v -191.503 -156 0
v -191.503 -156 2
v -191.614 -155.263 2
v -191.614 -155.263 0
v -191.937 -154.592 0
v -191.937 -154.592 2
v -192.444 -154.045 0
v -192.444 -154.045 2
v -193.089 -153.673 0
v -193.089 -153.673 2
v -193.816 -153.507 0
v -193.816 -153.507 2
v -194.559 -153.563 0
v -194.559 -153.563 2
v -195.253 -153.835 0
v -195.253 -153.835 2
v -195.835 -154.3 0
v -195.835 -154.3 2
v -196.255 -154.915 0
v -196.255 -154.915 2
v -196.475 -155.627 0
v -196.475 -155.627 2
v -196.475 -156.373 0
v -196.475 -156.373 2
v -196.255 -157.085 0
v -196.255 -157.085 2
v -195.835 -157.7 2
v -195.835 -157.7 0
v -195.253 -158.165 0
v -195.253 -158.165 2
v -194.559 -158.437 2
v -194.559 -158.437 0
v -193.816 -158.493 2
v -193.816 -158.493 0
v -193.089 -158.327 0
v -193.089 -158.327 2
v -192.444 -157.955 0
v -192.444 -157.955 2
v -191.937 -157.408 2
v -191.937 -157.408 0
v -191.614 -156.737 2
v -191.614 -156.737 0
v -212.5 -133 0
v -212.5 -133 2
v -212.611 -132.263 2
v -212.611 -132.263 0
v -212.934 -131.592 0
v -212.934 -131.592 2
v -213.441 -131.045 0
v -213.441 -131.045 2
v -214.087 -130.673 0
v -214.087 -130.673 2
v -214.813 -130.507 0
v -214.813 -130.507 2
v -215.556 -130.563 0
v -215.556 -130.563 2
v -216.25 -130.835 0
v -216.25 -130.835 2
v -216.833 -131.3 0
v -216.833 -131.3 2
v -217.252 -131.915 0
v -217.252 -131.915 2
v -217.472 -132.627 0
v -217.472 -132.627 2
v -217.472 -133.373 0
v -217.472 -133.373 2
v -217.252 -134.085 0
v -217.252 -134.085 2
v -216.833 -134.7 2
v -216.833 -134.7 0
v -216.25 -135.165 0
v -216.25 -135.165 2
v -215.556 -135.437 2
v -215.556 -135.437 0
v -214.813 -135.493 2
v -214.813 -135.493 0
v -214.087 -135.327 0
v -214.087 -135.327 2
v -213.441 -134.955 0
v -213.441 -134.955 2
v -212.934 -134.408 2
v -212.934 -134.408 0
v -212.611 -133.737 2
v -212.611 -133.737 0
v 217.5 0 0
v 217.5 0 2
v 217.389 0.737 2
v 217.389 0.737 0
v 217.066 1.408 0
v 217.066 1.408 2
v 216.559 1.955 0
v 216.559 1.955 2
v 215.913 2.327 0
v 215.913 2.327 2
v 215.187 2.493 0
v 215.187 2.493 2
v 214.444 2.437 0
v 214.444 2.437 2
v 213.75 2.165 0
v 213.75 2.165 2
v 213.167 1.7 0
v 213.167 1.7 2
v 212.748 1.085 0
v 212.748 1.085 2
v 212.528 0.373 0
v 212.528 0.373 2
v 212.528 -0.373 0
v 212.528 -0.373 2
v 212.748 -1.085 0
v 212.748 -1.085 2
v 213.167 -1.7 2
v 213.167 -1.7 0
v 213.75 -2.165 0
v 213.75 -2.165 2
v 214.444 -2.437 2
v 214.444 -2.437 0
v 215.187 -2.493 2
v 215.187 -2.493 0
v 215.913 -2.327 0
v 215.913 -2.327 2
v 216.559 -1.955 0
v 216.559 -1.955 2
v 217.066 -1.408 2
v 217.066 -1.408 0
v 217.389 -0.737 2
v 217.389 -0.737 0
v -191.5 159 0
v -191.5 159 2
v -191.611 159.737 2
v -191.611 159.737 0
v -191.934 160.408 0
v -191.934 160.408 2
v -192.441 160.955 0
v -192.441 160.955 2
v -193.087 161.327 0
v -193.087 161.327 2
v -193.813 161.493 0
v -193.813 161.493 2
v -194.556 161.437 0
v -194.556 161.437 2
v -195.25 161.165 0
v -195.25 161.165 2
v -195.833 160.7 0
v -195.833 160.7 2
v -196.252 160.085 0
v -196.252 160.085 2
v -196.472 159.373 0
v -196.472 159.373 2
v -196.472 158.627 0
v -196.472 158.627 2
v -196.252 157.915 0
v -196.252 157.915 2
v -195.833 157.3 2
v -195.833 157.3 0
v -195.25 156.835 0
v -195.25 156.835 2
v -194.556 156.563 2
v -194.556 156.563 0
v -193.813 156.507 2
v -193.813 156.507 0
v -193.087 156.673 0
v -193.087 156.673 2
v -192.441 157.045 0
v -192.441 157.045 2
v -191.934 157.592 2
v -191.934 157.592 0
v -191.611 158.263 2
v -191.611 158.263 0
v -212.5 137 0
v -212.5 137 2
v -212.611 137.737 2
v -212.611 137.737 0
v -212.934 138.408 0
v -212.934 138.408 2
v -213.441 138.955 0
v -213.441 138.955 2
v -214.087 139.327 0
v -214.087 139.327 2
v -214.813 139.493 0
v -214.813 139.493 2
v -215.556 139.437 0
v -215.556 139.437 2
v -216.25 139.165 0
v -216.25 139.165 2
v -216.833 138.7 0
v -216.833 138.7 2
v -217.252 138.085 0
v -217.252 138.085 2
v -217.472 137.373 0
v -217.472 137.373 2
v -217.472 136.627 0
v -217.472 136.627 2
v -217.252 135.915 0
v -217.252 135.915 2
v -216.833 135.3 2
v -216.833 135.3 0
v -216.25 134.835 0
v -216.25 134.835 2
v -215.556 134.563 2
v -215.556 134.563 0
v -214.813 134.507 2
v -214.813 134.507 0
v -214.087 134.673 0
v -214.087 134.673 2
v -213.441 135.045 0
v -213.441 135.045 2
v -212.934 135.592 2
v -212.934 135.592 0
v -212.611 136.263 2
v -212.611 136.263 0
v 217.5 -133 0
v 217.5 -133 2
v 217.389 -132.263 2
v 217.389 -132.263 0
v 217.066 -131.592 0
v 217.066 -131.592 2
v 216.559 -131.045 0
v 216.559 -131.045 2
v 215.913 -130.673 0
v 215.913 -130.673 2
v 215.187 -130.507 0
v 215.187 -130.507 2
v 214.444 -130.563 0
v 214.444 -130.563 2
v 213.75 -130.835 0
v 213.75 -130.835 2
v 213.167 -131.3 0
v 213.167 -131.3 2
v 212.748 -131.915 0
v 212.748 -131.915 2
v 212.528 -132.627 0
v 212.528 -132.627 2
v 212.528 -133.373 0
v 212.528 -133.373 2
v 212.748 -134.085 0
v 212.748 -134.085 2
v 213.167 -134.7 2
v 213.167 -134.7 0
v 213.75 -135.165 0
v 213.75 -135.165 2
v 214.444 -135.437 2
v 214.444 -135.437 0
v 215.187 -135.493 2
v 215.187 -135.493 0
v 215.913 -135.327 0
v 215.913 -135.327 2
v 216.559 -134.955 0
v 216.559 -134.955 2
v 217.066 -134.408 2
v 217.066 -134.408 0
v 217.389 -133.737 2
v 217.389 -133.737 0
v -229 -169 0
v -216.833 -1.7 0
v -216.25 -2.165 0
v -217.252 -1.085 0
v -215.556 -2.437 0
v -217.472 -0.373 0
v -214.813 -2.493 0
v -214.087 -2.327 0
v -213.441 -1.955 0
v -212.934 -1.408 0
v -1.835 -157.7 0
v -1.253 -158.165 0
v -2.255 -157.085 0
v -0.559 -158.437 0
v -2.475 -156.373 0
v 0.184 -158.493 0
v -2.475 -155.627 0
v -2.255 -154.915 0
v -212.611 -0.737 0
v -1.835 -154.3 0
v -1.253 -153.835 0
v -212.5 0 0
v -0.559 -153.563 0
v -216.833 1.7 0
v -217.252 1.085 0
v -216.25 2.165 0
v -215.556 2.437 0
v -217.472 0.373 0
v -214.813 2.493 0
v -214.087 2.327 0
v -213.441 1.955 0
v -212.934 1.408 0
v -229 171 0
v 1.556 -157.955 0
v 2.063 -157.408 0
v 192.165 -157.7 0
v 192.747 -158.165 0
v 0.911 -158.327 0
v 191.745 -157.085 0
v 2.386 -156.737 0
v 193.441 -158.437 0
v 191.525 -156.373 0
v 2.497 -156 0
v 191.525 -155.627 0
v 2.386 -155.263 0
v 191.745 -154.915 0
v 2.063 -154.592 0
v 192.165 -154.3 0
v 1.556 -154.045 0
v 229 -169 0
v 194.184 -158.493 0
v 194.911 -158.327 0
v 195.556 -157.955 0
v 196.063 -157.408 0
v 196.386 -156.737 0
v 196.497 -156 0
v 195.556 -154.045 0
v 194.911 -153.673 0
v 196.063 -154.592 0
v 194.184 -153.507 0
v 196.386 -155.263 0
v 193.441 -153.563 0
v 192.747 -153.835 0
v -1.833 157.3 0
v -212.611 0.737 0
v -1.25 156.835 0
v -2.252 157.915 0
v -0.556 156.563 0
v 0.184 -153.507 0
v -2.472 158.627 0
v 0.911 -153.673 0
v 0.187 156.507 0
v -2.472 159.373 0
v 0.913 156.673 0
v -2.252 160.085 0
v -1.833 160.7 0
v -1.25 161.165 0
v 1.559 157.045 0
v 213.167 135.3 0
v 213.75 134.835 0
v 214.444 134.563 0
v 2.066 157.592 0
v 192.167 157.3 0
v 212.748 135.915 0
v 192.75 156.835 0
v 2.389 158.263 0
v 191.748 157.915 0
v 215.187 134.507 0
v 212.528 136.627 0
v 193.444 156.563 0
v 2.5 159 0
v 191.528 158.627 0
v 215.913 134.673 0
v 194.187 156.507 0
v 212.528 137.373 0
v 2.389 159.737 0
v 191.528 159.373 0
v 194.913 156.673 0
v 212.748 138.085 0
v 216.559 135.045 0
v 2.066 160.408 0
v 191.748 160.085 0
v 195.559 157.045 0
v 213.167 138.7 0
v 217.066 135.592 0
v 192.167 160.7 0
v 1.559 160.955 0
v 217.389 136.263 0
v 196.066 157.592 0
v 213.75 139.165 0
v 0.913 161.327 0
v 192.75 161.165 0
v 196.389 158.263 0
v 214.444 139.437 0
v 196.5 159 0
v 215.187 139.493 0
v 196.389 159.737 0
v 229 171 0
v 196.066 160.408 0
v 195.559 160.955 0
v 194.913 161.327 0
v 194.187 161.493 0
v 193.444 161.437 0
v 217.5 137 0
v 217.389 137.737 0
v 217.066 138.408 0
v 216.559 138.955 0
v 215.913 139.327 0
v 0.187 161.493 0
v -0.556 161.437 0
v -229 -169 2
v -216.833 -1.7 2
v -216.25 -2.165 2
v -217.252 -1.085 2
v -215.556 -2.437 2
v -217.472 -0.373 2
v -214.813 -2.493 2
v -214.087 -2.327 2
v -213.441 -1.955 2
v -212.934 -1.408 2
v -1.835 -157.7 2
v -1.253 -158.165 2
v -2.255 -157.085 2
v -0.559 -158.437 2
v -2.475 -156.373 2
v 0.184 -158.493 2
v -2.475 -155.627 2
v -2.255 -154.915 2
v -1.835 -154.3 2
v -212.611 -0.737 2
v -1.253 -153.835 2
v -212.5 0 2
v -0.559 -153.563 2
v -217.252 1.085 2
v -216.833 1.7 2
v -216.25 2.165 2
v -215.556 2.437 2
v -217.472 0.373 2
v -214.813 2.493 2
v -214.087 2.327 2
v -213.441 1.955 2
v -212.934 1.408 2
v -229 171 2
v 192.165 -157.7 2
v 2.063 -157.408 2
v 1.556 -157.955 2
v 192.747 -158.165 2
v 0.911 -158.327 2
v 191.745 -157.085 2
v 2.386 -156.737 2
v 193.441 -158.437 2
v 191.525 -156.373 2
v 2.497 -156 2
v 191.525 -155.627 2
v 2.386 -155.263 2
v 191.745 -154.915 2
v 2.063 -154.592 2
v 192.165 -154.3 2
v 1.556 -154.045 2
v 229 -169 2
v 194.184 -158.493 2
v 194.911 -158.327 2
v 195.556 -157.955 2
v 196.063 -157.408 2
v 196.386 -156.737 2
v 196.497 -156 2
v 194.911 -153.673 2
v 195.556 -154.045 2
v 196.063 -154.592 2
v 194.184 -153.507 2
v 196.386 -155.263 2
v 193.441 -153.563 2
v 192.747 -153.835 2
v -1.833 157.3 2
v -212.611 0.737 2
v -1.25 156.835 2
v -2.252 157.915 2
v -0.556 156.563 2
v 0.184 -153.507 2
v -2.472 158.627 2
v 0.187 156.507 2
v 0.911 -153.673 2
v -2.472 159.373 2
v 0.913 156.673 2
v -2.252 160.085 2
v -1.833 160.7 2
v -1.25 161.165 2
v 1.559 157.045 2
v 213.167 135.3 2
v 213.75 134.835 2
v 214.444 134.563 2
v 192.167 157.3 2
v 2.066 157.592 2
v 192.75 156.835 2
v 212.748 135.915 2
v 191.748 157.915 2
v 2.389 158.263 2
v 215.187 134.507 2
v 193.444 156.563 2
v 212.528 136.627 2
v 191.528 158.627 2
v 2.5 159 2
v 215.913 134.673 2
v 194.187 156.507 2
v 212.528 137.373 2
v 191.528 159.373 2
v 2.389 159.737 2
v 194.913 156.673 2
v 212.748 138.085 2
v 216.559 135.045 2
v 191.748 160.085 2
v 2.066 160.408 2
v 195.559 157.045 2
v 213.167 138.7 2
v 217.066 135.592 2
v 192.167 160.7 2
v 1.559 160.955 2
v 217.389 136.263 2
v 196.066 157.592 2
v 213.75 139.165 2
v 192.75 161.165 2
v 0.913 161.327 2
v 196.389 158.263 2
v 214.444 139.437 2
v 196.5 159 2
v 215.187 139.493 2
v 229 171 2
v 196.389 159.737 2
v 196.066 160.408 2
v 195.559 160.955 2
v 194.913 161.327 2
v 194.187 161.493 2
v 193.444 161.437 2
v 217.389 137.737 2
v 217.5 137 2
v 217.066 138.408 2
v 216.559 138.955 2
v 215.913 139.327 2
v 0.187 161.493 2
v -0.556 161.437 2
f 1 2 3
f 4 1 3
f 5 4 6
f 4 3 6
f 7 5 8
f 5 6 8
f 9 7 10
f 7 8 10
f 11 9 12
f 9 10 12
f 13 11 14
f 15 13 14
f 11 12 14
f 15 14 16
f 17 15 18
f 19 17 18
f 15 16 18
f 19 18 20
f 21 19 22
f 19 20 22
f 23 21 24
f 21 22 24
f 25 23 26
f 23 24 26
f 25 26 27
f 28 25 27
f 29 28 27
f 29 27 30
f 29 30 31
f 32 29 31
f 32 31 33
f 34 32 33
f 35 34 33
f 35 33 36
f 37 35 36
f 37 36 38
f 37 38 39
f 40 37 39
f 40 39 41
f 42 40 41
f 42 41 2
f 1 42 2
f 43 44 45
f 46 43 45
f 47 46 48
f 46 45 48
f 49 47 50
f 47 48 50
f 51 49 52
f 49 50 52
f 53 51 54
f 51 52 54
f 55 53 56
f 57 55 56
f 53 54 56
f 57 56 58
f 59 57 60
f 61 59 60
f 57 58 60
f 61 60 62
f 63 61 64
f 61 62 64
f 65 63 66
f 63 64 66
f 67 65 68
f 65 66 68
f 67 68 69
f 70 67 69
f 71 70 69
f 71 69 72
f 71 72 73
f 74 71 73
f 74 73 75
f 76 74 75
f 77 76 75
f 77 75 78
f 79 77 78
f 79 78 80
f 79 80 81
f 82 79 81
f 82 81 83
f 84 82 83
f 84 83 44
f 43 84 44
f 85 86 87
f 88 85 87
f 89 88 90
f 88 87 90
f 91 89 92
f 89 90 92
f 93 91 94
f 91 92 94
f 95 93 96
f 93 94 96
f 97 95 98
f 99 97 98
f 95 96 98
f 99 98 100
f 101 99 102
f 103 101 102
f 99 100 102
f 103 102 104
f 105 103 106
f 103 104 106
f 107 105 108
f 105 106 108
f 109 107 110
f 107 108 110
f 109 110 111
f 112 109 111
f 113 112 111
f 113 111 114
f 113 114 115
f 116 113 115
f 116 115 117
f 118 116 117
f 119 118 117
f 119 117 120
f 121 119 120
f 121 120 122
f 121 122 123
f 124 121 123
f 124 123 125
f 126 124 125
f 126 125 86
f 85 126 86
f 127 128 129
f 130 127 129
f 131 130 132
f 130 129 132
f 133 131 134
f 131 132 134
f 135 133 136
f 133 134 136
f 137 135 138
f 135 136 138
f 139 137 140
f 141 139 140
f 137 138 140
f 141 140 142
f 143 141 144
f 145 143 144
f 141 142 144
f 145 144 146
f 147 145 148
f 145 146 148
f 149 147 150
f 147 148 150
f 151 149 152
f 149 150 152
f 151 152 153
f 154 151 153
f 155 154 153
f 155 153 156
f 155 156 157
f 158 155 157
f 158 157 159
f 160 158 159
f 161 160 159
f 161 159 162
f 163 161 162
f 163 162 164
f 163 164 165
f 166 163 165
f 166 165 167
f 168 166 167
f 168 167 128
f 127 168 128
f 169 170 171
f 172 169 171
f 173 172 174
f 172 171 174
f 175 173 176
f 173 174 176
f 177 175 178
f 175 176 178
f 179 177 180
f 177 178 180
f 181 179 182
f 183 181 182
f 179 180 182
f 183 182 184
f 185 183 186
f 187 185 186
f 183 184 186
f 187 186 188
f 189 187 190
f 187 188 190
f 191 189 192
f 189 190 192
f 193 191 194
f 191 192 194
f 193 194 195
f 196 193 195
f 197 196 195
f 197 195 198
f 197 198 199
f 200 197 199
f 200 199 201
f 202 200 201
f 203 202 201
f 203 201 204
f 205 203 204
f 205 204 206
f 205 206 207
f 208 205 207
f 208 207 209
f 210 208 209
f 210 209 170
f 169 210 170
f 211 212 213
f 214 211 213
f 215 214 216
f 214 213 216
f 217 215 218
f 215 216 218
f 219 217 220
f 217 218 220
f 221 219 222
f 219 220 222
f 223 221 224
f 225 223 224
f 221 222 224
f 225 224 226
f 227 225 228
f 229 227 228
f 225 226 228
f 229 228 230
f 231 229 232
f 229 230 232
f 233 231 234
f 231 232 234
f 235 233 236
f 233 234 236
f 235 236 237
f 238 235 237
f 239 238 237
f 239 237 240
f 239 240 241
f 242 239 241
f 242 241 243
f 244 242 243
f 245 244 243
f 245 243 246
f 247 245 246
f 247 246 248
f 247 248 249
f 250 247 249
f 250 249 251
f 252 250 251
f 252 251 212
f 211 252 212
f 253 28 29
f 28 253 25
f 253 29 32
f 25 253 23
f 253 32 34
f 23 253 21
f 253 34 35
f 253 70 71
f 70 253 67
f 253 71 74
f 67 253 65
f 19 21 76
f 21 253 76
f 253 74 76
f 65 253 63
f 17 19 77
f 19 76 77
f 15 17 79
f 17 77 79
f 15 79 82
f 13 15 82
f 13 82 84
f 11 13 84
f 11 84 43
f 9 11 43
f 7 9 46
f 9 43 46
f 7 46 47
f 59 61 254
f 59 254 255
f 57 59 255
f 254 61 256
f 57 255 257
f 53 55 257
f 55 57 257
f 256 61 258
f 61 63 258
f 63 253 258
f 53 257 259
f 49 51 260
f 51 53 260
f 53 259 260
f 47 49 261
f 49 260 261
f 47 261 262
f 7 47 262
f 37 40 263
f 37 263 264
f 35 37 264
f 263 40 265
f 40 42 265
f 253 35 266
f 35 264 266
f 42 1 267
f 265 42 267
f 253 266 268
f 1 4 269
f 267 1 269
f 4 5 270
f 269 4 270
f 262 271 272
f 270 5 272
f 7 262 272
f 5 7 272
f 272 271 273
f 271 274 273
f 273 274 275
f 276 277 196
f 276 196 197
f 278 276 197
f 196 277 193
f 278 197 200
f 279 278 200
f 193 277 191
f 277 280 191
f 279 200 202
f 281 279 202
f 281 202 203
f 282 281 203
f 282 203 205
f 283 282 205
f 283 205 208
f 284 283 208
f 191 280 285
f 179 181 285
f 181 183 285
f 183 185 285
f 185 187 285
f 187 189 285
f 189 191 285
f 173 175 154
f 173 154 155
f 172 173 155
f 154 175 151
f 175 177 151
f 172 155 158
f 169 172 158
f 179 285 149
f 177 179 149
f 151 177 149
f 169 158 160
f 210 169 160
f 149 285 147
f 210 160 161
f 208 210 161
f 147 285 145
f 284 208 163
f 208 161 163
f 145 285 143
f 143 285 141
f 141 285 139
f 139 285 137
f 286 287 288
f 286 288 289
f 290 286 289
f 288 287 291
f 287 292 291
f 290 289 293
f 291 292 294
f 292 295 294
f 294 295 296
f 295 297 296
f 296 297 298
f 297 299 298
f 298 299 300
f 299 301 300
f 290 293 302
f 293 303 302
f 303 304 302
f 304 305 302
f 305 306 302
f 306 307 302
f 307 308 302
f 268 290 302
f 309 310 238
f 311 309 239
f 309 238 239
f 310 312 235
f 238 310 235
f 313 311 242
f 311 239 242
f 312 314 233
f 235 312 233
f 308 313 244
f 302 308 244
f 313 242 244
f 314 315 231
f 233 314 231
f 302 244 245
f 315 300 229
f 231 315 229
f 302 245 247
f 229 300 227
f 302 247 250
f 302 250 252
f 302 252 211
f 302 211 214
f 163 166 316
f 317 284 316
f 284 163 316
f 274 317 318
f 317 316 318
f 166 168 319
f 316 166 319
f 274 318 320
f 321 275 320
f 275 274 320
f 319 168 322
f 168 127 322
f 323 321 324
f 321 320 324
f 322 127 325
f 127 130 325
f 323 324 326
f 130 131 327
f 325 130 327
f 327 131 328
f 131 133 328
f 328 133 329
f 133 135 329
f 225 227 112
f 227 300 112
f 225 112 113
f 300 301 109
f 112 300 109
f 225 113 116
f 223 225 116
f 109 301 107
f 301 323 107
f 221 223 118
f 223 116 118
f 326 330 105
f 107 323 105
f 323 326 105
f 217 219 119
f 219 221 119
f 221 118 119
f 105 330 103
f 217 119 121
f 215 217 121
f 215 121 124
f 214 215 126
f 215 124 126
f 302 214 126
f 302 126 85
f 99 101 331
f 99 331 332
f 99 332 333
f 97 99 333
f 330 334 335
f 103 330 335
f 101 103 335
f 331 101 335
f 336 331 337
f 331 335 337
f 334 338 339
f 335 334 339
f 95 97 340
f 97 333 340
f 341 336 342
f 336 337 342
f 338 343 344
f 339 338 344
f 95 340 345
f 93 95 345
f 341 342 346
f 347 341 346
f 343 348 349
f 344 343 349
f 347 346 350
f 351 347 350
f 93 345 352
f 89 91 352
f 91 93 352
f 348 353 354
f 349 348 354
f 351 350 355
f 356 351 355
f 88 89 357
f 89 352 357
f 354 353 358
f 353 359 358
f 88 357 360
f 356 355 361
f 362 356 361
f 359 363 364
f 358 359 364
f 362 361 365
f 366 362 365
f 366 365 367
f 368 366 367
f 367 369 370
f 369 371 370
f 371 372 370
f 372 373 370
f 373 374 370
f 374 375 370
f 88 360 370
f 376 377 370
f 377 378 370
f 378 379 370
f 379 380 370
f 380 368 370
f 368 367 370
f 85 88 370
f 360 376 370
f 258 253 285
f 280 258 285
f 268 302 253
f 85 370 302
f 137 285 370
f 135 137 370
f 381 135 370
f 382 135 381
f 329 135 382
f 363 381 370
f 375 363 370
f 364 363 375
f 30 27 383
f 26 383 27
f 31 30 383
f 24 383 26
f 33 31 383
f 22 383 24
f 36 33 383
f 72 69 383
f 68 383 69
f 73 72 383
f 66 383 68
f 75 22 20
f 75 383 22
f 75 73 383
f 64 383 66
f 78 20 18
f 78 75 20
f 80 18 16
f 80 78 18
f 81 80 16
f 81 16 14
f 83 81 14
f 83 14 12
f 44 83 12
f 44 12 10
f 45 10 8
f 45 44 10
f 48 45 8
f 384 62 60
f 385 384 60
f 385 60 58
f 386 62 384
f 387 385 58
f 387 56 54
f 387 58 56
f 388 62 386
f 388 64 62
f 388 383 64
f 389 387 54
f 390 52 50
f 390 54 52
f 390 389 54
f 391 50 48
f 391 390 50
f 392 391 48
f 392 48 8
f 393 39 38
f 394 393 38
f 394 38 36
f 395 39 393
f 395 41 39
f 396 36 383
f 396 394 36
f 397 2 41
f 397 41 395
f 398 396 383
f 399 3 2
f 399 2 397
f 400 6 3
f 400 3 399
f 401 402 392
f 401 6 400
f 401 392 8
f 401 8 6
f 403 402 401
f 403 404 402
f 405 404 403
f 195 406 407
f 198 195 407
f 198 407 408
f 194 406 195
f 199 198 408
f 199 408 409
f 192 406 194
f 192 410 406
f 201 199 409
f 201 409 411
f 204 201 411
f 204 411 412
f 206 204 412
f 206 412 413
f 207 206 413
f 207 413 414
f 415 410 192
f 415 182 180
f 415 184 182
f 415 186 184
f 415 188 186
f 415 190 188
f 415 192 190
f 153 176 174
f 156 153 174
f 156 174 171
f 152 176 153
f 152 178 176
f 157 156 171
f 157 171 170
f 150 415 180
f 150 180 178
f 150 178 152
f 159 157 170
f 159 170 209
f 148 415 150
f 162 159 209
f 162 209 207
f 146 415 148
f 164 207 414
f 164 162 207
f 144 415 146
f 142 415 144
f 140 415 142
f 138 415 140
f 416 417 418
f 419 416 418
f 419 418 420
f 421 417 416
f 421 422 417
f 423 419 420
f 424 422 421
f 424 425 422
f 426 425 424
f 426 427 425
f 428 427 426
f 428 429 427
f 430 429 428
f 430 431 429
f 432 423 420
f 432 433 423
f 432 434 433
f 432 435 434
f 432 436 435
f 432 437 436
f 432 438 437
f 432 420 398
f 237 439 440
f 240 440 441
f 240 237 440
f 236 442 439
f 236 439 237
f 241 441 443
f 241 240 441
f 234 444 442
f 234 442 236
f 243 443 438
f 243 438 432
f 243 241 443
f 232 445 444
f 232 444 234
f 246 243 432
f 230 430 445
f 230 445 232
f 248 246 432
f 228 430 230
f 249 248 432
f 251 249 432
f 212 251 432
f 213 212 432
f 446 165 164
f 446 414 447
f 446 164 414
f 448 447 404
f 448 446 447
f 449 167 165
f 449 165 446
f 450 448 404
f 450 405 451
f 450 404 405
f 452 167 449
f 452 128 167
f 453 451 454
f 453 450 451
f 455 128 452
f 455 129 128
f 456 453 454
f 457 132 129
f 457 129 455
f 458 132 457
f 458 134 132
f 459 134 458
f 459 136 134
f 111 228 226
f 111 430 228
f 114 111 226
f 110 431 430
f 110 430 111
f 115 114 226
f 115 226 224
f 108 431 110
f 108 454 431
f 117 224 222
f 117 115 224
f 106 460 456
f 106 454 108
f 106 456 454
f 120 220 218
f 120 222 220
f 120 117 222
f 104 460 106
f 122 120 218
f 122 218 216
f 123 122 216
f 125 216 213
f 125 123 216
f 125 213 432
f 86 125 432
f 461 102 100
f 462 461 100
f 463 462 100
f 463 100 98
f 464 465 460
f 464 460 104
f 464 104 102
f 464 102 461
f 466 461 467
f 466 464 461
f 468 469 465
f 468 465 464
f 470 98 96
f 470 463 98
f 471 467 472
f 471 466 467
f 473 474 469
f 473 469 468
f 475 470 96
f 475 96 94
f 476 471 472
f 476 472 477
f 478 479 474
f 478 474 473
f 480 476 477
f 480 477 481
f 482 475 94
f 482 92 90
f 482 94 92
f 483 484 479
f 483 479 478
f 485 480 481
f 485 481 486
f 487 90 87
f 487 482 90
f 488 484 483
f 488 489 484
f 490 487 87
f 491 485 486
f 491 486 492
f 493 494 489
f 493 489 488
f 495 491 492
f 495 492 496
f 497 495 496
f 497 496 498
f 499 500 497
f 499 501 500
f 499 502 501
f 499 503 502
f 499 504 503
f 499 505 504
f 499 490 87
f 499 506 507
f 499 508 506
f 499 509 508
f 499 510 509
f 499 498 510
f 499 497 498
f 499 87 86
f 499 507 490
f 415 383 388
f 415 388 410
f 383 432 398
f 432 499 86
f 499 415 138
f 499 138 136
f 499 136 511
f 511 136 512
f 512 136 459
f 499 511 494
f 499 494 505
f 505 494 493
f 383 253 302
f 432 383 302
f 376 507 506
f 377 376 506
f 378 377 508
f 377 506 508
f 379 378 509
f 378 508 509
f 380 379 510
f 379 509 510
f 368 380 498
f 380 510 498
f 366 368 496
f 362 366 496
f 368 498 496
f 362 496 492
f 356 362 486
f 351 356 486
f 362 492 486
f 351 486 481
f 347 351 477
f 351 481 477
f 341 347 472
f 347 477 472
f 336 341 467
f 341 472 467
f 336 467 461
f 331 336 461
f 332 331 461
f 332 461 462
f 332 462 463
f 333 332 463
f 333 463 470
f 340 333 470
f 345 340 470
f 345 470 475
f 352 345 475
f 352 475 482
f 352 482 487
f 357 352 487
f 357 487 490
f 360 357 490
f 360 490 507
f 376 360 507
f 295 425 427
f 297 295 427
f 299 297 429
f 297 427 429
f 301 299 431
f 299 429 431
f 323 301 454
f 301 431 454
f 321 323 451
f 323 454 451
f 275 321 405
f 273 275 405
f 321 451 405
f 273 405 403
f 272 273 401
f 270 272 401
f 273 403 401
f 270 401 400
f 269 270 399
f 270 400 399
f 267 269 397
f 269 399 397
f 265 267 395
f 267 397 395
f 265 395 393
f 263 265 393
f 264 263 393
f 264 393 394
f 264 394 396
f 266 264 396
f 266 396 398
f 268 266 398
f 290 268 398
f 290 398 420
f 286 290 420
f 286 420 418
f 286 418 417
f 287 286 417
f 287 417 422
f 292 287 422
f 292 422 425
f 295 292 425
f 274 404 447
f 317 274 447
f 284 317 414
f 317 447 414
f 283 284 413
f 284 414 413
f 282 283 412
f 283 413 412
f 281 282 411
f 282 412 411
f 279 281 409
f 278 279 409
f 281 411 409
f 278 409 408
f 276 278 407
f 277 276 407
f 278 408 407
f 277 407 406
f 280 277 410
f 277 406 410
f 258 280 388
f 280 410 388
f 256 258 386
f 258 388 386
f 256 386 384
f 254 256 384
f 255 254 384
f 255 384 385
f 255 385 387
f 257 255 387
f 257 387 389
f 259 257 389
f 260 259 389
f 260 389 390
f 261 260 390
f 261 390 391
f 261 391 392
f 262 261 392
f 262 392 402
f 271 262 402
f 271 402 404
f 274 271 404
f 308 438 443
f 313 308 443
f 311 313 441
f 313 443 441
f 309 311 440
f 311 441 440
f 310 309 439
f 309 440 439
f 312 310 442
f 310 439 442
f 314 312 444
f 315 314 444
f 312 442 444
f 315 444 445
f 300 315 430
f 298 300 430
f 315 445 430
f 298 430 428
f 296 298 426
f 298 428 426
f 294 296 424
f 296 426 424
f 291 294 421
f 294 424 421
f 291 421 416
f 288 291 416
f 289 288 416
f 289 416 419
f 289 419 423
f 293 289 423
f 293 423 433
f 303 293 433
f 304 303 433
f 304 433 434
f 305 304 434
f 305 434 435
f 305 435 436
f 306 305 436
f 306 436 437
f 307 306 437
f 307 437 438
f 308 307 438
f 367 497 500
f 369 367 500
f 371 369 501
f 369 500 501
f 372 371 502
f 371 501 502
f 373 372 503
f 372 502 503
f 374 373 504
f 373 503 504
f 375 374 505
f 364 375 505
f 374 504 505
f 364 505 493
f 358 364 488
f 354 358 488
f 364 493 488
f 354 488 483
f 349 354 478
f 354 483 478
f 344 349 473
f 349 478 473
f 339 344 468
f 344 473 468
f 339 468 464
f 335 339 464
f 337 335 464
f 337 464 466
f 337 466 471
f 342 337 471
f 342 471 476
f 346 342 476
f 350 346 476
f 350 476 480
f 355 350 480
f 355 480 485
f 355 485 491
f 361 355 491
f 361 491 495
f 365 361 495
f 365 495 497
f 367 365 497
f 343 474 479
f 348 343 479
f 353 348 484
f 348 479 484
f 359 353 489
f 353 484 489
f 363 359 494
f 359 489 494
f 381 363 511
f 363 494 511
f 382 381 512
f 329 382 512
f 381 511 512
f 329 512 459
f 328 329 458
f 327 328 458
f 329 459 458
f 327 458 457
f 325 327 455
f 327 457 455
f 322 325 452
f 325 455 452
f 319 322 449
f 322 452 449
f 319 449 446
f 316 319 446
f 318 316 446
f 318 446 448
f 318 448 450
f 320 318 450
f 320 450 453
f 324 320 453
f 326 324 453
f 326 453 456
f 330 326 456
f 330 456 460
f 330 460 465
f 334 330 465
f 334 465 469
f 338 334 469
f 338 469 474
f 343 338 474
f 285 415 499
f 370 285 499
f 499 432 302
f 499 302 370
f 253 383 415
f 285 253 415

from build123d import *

# Parameters (mm, degrees)
SKETCH1_W           = 458
SKETCH1_H           = 338
BOSS_EXTRUDE1_DEPTH = 2
SKETCH2_R           = 2.5
CUT_EXTRUDE1_DEPTH  = 285.615530145
SKETCH3_W           = 458
SKETCH3_H           = 2
BOSS_EXTRUDE2_DEPTH = 2


with BuildPart() as part:
    # Sketch1 → Boss-Extrude1 (new body)
    with BuildSketch(Plane.XY):
        Rectangle(SKETCH1_W, SKETCH1_H)
    extrude(amount=BOSS_EXTRUDE1_DEPTH)

    # Sketch2 → Cut-Extrude1 (cut, through all)
    with BuildSketch(Plane.XY.offset(2)):
        with Locations((-194, 159)):
            Circle(SKETCH2_R)
        with Locations((-194.002577337, -156)):
            Circle(SKETCH2_R)
        with Locations((193.997422663, -156)):
            Circle(SKETCH2_R)
        with Locations((194, 159)):
            Circle(SKETCH2_R)
        with Locations((-215, 0)):
            Circle(SKETCH2_R)
        with Locations((-215, -133)):
            Circle(SKETCH2_R)
        with Locations((-215, 137)):
            Circle(SKETCH2_R)
        with Locations((215, 0)):
            Circle(SKETCH2_R)
        with Locations((215, -133)):
            Circle(SKETCH2_R)
        with Locations((215, 137)):
            Circle(SKETCH2_R)
        with Locations((0, 159)):
            Circle(SKETCH2_R)
        with Locations((-0.002577337, -156)):
            Circle(SKETCH2_R)
    extrude(amount=-CUT_EXTRUDE1_DEPTH, mode=Mode.SUBTRACT)

    # Sketch3 → Boss-Extrude2 (add, through all)
    with BuildSketch(Plane.XY.offset(2)):
        with Locations((0, 170)):
            Rectangle(SKETCH3_W, SKETCH3_H)
    extrude(amount=-BOSS_EXTRUDE2_DEPTH)


solid = part.part
